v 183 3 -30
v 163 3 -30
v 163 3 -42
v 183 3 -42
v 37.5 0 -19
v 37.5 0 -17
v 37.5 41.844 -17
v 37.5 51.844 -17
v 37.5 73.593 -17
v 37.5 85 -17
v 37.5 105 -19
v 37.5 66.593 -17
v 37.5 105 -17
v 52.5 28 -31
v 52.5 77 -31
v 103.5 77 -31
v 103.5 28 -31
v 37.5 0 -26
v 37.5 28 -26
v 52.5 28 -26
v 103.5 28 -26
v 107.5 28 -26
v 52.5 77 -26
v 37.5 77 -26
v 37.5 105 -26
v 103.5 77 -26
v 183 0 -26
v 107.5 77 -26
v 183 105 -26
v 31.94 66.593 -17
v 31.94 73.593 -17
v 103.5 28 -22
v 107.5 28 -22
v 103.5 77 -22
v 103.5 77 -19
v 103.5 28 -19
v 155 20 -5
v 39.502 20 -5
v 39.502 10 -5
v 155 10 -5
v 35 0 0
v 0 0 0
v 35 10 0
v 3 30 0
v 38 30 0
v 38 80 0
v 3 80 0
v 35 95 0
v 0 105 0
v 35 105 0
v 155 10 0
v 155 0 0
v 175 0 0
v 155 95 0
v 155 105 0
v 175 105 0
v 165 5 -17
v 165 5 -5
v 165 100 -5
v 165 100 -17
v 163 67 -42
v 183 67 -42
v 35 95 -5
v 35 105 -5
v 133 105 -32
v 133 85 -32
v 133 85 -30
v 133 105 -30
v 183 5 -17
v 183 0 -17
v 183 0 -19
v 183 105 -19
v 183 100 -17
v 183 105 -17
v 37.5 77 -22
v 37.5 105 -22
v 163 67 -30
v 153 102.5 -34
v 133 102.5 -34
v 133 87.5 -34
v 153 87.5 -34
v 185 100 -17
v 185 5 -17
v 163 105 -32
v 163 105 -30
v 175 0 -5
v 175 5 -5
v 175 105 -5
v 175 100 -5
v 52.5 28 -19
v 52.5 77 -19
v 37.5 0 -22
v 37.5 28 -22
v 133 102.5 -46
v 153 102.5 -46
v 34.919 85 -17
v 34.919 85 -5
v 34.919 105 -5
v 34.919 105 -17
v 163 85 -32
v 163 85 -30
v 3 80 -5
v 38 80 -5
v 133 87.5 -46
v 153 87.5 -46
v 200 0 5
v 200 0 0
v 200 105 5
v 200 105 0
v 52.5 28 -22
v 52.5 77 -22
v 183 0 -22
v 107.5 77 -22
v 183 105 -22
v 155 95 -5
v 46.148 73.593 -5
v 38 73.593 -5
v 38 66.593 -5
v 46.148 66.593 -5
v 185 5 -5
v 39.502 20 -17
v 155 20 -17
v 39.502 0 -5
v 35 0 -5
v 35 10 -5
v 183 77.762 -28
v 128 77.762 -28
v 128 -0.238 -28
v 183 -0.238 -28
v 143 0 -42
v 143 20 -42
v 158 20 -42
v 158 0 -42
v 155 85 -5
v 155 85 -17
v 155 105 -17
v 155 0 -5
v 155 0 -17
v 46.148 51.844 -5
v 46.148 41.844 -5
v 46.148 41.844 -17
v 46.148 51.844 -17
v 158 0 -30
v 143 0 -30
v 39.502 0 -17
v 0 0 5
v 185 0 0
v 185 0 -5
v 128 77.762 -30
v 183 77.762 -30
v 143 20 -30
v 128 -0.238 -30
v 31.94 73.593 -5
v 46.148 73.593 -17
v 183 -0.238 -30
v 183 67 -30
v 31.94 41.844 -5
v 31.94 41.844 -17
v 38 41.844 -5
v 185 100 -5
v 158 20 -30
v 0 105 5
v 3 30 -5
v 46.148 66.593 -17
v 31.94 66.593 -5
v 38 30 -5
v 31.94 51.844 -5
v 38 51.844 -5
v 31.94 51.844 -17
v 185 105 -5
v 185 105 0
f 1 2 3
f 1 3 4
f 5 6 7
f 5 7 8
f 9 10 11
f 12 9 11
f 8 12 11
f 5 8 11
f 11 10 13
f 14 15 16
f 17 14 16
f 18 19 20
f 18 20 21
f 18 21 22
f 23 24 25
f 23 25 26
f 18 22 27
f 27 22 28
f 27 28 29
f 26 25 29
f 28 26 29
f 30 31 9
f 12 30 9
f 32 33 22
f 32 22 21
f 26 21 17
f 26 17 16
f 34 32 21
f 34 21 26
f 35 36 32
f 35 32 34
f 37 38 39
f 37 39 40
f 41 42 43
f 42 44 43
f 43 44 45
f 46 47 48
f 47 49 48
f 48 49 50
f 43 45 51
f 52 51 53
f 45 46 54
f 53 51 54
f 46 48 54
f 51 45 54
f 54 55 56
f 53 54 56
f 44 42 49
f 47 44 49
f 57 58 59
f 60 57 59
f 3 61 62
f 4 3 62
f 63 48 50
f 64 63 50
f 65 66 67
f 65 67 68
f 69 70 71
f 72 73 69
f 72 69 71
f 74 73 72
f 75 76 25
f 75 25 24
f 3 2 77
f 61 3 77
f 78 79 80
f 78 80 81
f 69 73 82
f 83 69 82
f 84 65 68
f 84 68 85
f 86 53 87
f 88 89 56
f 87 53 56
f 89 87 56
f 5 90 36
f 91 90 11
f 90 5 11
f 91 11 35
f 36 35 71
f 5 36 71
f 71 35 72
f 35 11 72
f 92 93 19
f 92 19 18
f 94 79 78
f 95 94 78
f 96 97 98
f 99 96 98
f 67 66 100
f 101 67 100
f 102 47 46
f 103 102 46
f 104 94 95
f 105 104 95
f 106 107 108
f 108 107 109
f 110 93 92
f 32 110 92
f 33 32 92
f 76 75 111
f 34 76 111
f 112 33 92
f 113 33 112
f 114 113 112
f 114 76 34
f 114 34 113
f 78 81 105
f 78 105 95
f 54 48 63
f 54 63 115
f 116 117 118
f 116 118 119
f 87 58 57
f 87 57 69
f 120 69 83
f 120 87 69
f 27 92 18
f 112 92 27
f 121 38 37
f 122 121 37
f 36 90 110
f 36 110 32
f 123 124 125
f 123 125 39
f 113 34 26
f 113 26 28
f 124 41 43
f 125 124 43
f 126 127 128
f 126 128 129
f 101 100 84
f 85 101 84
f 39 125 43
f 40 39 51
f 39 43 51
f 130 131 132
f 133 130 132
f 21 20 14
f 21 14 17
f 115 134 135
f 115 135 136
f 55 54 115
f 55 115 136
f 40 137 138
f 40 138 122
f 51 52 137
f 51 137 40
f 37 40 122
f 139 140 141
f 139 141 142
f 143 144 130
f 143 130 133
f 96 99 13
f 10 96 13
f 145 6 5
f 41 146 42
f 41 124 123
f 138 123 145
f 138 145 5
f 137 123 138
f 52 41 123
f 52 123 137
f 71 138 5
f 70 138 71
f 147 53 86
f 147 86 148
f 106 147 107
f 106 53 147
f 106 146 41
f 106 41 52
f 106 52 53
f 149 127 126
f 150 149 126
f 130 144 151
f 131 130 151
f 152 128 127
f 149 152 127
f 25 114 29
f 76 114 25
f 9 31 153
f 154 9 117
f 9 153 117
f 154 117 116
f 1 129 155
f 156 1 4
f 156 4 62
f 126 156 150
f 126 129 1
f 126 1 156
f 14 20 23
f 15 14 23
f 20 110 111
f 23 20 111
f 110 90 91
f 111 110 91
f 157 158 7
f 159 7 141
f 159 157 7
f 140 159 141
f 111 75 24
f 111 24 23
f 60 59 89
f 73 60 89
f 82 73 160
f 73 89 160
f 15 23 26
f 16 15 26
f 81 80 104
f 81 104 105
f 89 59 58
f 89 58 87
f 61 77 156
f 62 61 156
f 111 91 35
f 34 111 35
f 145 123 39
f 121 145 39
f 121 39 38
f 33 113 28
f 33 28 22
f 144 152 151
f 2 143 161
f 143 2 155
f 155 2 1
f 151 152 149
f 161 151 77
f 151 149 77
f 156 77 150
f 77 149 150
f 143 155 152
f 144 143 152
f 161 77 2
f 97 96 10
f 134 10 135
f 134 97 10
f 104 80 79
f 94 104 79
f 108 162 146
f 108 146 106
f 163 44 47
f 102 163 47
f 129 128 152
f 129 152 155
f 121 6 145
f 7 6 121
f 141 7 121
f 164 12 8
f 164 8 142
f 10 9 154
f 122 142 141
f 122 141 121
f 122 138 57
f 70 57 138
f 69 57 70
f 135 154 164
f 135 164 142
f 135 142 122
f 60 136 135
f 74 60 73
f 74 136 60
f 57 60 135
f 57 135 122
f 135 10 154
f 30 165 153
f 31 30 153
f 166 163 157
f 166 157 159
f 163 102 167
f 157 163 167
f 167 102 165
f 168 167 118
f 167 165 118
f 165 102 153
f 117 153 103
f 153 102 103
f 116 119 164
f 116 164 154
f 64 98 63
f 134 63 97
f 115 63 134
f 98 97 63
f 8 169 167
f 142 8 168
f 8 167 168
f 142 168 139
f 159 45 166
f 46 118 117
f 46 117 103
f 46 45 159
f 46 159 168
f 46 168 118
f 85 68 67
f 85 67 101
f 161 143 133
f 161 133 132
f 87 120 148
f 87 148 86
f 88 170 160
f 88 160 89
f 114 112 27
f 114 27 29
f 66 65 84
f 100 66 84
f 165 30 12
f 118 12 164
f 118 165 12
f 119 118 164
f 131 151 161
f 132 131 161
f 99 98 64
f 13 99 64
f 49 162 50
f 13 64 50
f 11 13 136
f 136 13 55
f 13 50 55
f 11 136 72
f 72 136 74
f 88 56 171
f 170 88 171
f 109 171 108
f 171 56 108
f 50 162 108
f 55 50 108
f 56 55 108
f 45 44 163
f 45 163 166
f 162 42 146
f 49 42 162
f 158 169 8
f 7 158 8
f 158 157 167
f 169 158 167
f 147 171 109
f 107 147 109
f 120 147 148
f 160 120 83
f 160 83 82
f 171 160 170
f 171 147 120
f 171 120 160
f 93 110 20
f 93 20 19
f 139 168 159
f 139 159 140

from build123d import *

# Parameters (mm, degrees)
SKETCH2_W            = 200
SKETCH2_H            = 105
BOSS_EXTRUDE1_DEPTH  = 5
SKETCH3_W            = 10
SKETCH3_H            = 105
BOSS_EXTRUDE2_DEPTH  = 5
SKETCH4_W            = 120
SKETCH4_H            = 10
BOSS_EXTRUDE3_DEPTH  = 5
SKETCH5_W            = 35
SKETCH5_H            = 50
BOSS_EXTRUDE4_DEPTH  = 5
SKETCH7_W            = 20
SKETCH7_H            = 95
SKETCH7_W_2          = 115.497788715
SKETCH7_H_2          = 20
SKETCH7_W_3          = 120.080954526
SKETCH7_W_4          = 14.207814016
SKETCH7_H_3          = 7
SKETCH7_H_4          = 10
BOSS_EXTRUDE5_DEPTH  = 12
SKETCH8_W            = 145.5
SKETCH8_H            = 105
BOSS_EXTRUDE6_DEPTH  = 2
BOSS_EXTRUDE7_DEPTH  = 4
SKETCH10_W           = 51
SKETCH10_H           = 49
BOSS_EXTRUDE8_DEPTH  = 14
SKETCH11_W           = 55
SKETCH11_H           = 78
BOSS_EXTRUDE9_DEPTH  = 2
SKETCH12_W           = 20
SKETCH12_H           = 64
SKETCH12_W_2         = 15
SKETCH12_H_2         = 20
BOSS_EXTRUDE10_DEPTH = 12
SKETCH13_W           = 30
SKETCH13_H           = 20
BOSS_EXTRUDE11_DEPTH = 2
SKETCH14_W           = 20
SKETCH14_H           = 15
BOSS_EXTRUDE12_DEPTH = 12


with BuildPart() as part:
    # Sketch2 → Boss-Extrude1 (new body)
    with BuildSketch(Plane.XY):
        with Locations((100, 52.5)):
            Rectangle(SKETCH2_W, SKETCH2_H)
    extrude(amount=BOSS_EXTRUDE1_DEPTH)

    # Sketch3 → Boss-Extrude2 (add)
    with BuildSketch(Plane(origin=(0, 0, 0), x_dir=(-1, 0, 0), z_dir=(0, 0, -1))):
        with Locations((-180, 52.5)):
            Rectangle(SKETCH3_W, SKETCH3_H)
    extrude(amount=BOSS_EXTRUDE2_DEPTH)

    # Sketch4 → Boss-Extrude3 (add)
    with BuildSketch(Plane.XY):
        with Locations((95, 5)):
            Rectangle(SKETCH4_W, SKETCH4_H)
        with Locations((95, 100)):
            Rectangle(SKETCH4_W, SKETCH4_H)
    extrude(amount=-BOSS_EXTRUDE3_DEPTH)

    # Sketch5 → Boss-Extrude4 (add)
    with BuildSketch(Plane.XY):
        with Locations((20.5, 55)):
            Rectangle(SKETCH5_W, SKETCH5_H)
    extrude(amount=-BOSS_EXTRUDE4_DEPTH)

    # Sketch7 → Boss-Extrude5 (add)
    with BuildSketch(Plane.XY.offset(-5)):
        with Locations((175, 52.5)):
            Rectangle(SKETCH7_W, SKETCH7_H)
        with Locations((97.251105642, 10)):
            Rectangle(SKETCH7_W_2, SKETCH7_H_2)
        with Locations((94.959522737, 95)):
            Rectangle(SKETCH7_W_3, SKETCH7_H_2)
        with Locations((39.043894704, 70.093234871)):
            Rectangle(SKETCH7_W_4, SKETCH7_H_3)
        with Locations((39.043894704, 46.844139488)):
            Rectangle(SKETCH7_W_4, SKETCH7_H_4)
    extrude(amount=-BOSS_EXTRUDE5_DEPTH)

    # Sketch8 → Boss-Extrude6 (add)
    with BuildSketch(Plane.XY.offset(-17)):
        with Locations((110.25, 52.5)):
            Rectangle(SKETCH8_W, SKETCH8_H)
    extrude(amount=-BOSS_EXTRUDE6_DEPTH)



with BuildPart() as body_2:
    # Sketch9 → Boss-Extrude7 (new body)
    with BuildSketch(Plane.XY.offset(-22)):
        Polygon((37.5, 0), (183, 0), (183, 105), (37.5, 105), (37.5, 77), (107.5, 77), (107.5, 28), (37.5, 28), align=None)
    extrude(amount=-BOSS_EXTRUDE7_DEPTH)


with BuildPart() as part_1:
    add(part.part)

    add(body_2.part)  # Boss-Extrude8 merges body 2
    # Sketch10 → Boss-Extrude8 (add)
    with BuildSketch(Plane.XY.offset(-17)):
        with Locations((78, 52.5)):
            Rectangle(SKETCH10_W, SKETCH10_H)
    extrude(amount=-BOSS_EXTRUDE8_DEPTH)


with BuildPart() as body_2_2:
    # Sketch11 → Boss-Extrude9 (new body)
    with BuildSketch(Plane.XY.offset(-28)):
        with Locations((155.5, 38.761527983)):
            Rectangle(SKETCH11_W, SKETCH11_H)
    extrude(amount=-BOSS_EXTRUDE9_DEPTH)

    # Sketch12 → Boss-Extrude10 (add)
    with BuildSketch(Plane.XY.offset(-30)):
        with Locations((173, 35)):
            Rectangle(SKETCH12_W, SKETCH12_H)
        with Locations((150.5, 10)):
            Rectangle(SKETCH12_W_2, SKETCH12_H_2)
    extrude(amount=-BOSS_EXTRUDE10_DEPTH)


with BuildPart() as body_3:
    # Sketch13 → Boss-Extrude11 (new body)
    with BuildSketch(Plane.XY.offset(-32)):
        with Locations((148, 95)):
            Rectangle(SKETCH13_W, SKETCH13_H)
    extrude(amount=BOSS_EXTRUDE11_DEPTH)


with BuildPart() as body_4:
    # Sketch14 → Boss-Extrude12 (new body)
    with BuildSketch(Plane.XY.offset(-34)):
        with Locations((143, 95)):
            Rectangle(SKETCH14_W, SKETCH14_H)
    extrude(amount=-BOSS_EXTRUDE12_DEPTH)


solid = Compound([part_1.part, body_2_2.part, body_3.part, body_4.part])
